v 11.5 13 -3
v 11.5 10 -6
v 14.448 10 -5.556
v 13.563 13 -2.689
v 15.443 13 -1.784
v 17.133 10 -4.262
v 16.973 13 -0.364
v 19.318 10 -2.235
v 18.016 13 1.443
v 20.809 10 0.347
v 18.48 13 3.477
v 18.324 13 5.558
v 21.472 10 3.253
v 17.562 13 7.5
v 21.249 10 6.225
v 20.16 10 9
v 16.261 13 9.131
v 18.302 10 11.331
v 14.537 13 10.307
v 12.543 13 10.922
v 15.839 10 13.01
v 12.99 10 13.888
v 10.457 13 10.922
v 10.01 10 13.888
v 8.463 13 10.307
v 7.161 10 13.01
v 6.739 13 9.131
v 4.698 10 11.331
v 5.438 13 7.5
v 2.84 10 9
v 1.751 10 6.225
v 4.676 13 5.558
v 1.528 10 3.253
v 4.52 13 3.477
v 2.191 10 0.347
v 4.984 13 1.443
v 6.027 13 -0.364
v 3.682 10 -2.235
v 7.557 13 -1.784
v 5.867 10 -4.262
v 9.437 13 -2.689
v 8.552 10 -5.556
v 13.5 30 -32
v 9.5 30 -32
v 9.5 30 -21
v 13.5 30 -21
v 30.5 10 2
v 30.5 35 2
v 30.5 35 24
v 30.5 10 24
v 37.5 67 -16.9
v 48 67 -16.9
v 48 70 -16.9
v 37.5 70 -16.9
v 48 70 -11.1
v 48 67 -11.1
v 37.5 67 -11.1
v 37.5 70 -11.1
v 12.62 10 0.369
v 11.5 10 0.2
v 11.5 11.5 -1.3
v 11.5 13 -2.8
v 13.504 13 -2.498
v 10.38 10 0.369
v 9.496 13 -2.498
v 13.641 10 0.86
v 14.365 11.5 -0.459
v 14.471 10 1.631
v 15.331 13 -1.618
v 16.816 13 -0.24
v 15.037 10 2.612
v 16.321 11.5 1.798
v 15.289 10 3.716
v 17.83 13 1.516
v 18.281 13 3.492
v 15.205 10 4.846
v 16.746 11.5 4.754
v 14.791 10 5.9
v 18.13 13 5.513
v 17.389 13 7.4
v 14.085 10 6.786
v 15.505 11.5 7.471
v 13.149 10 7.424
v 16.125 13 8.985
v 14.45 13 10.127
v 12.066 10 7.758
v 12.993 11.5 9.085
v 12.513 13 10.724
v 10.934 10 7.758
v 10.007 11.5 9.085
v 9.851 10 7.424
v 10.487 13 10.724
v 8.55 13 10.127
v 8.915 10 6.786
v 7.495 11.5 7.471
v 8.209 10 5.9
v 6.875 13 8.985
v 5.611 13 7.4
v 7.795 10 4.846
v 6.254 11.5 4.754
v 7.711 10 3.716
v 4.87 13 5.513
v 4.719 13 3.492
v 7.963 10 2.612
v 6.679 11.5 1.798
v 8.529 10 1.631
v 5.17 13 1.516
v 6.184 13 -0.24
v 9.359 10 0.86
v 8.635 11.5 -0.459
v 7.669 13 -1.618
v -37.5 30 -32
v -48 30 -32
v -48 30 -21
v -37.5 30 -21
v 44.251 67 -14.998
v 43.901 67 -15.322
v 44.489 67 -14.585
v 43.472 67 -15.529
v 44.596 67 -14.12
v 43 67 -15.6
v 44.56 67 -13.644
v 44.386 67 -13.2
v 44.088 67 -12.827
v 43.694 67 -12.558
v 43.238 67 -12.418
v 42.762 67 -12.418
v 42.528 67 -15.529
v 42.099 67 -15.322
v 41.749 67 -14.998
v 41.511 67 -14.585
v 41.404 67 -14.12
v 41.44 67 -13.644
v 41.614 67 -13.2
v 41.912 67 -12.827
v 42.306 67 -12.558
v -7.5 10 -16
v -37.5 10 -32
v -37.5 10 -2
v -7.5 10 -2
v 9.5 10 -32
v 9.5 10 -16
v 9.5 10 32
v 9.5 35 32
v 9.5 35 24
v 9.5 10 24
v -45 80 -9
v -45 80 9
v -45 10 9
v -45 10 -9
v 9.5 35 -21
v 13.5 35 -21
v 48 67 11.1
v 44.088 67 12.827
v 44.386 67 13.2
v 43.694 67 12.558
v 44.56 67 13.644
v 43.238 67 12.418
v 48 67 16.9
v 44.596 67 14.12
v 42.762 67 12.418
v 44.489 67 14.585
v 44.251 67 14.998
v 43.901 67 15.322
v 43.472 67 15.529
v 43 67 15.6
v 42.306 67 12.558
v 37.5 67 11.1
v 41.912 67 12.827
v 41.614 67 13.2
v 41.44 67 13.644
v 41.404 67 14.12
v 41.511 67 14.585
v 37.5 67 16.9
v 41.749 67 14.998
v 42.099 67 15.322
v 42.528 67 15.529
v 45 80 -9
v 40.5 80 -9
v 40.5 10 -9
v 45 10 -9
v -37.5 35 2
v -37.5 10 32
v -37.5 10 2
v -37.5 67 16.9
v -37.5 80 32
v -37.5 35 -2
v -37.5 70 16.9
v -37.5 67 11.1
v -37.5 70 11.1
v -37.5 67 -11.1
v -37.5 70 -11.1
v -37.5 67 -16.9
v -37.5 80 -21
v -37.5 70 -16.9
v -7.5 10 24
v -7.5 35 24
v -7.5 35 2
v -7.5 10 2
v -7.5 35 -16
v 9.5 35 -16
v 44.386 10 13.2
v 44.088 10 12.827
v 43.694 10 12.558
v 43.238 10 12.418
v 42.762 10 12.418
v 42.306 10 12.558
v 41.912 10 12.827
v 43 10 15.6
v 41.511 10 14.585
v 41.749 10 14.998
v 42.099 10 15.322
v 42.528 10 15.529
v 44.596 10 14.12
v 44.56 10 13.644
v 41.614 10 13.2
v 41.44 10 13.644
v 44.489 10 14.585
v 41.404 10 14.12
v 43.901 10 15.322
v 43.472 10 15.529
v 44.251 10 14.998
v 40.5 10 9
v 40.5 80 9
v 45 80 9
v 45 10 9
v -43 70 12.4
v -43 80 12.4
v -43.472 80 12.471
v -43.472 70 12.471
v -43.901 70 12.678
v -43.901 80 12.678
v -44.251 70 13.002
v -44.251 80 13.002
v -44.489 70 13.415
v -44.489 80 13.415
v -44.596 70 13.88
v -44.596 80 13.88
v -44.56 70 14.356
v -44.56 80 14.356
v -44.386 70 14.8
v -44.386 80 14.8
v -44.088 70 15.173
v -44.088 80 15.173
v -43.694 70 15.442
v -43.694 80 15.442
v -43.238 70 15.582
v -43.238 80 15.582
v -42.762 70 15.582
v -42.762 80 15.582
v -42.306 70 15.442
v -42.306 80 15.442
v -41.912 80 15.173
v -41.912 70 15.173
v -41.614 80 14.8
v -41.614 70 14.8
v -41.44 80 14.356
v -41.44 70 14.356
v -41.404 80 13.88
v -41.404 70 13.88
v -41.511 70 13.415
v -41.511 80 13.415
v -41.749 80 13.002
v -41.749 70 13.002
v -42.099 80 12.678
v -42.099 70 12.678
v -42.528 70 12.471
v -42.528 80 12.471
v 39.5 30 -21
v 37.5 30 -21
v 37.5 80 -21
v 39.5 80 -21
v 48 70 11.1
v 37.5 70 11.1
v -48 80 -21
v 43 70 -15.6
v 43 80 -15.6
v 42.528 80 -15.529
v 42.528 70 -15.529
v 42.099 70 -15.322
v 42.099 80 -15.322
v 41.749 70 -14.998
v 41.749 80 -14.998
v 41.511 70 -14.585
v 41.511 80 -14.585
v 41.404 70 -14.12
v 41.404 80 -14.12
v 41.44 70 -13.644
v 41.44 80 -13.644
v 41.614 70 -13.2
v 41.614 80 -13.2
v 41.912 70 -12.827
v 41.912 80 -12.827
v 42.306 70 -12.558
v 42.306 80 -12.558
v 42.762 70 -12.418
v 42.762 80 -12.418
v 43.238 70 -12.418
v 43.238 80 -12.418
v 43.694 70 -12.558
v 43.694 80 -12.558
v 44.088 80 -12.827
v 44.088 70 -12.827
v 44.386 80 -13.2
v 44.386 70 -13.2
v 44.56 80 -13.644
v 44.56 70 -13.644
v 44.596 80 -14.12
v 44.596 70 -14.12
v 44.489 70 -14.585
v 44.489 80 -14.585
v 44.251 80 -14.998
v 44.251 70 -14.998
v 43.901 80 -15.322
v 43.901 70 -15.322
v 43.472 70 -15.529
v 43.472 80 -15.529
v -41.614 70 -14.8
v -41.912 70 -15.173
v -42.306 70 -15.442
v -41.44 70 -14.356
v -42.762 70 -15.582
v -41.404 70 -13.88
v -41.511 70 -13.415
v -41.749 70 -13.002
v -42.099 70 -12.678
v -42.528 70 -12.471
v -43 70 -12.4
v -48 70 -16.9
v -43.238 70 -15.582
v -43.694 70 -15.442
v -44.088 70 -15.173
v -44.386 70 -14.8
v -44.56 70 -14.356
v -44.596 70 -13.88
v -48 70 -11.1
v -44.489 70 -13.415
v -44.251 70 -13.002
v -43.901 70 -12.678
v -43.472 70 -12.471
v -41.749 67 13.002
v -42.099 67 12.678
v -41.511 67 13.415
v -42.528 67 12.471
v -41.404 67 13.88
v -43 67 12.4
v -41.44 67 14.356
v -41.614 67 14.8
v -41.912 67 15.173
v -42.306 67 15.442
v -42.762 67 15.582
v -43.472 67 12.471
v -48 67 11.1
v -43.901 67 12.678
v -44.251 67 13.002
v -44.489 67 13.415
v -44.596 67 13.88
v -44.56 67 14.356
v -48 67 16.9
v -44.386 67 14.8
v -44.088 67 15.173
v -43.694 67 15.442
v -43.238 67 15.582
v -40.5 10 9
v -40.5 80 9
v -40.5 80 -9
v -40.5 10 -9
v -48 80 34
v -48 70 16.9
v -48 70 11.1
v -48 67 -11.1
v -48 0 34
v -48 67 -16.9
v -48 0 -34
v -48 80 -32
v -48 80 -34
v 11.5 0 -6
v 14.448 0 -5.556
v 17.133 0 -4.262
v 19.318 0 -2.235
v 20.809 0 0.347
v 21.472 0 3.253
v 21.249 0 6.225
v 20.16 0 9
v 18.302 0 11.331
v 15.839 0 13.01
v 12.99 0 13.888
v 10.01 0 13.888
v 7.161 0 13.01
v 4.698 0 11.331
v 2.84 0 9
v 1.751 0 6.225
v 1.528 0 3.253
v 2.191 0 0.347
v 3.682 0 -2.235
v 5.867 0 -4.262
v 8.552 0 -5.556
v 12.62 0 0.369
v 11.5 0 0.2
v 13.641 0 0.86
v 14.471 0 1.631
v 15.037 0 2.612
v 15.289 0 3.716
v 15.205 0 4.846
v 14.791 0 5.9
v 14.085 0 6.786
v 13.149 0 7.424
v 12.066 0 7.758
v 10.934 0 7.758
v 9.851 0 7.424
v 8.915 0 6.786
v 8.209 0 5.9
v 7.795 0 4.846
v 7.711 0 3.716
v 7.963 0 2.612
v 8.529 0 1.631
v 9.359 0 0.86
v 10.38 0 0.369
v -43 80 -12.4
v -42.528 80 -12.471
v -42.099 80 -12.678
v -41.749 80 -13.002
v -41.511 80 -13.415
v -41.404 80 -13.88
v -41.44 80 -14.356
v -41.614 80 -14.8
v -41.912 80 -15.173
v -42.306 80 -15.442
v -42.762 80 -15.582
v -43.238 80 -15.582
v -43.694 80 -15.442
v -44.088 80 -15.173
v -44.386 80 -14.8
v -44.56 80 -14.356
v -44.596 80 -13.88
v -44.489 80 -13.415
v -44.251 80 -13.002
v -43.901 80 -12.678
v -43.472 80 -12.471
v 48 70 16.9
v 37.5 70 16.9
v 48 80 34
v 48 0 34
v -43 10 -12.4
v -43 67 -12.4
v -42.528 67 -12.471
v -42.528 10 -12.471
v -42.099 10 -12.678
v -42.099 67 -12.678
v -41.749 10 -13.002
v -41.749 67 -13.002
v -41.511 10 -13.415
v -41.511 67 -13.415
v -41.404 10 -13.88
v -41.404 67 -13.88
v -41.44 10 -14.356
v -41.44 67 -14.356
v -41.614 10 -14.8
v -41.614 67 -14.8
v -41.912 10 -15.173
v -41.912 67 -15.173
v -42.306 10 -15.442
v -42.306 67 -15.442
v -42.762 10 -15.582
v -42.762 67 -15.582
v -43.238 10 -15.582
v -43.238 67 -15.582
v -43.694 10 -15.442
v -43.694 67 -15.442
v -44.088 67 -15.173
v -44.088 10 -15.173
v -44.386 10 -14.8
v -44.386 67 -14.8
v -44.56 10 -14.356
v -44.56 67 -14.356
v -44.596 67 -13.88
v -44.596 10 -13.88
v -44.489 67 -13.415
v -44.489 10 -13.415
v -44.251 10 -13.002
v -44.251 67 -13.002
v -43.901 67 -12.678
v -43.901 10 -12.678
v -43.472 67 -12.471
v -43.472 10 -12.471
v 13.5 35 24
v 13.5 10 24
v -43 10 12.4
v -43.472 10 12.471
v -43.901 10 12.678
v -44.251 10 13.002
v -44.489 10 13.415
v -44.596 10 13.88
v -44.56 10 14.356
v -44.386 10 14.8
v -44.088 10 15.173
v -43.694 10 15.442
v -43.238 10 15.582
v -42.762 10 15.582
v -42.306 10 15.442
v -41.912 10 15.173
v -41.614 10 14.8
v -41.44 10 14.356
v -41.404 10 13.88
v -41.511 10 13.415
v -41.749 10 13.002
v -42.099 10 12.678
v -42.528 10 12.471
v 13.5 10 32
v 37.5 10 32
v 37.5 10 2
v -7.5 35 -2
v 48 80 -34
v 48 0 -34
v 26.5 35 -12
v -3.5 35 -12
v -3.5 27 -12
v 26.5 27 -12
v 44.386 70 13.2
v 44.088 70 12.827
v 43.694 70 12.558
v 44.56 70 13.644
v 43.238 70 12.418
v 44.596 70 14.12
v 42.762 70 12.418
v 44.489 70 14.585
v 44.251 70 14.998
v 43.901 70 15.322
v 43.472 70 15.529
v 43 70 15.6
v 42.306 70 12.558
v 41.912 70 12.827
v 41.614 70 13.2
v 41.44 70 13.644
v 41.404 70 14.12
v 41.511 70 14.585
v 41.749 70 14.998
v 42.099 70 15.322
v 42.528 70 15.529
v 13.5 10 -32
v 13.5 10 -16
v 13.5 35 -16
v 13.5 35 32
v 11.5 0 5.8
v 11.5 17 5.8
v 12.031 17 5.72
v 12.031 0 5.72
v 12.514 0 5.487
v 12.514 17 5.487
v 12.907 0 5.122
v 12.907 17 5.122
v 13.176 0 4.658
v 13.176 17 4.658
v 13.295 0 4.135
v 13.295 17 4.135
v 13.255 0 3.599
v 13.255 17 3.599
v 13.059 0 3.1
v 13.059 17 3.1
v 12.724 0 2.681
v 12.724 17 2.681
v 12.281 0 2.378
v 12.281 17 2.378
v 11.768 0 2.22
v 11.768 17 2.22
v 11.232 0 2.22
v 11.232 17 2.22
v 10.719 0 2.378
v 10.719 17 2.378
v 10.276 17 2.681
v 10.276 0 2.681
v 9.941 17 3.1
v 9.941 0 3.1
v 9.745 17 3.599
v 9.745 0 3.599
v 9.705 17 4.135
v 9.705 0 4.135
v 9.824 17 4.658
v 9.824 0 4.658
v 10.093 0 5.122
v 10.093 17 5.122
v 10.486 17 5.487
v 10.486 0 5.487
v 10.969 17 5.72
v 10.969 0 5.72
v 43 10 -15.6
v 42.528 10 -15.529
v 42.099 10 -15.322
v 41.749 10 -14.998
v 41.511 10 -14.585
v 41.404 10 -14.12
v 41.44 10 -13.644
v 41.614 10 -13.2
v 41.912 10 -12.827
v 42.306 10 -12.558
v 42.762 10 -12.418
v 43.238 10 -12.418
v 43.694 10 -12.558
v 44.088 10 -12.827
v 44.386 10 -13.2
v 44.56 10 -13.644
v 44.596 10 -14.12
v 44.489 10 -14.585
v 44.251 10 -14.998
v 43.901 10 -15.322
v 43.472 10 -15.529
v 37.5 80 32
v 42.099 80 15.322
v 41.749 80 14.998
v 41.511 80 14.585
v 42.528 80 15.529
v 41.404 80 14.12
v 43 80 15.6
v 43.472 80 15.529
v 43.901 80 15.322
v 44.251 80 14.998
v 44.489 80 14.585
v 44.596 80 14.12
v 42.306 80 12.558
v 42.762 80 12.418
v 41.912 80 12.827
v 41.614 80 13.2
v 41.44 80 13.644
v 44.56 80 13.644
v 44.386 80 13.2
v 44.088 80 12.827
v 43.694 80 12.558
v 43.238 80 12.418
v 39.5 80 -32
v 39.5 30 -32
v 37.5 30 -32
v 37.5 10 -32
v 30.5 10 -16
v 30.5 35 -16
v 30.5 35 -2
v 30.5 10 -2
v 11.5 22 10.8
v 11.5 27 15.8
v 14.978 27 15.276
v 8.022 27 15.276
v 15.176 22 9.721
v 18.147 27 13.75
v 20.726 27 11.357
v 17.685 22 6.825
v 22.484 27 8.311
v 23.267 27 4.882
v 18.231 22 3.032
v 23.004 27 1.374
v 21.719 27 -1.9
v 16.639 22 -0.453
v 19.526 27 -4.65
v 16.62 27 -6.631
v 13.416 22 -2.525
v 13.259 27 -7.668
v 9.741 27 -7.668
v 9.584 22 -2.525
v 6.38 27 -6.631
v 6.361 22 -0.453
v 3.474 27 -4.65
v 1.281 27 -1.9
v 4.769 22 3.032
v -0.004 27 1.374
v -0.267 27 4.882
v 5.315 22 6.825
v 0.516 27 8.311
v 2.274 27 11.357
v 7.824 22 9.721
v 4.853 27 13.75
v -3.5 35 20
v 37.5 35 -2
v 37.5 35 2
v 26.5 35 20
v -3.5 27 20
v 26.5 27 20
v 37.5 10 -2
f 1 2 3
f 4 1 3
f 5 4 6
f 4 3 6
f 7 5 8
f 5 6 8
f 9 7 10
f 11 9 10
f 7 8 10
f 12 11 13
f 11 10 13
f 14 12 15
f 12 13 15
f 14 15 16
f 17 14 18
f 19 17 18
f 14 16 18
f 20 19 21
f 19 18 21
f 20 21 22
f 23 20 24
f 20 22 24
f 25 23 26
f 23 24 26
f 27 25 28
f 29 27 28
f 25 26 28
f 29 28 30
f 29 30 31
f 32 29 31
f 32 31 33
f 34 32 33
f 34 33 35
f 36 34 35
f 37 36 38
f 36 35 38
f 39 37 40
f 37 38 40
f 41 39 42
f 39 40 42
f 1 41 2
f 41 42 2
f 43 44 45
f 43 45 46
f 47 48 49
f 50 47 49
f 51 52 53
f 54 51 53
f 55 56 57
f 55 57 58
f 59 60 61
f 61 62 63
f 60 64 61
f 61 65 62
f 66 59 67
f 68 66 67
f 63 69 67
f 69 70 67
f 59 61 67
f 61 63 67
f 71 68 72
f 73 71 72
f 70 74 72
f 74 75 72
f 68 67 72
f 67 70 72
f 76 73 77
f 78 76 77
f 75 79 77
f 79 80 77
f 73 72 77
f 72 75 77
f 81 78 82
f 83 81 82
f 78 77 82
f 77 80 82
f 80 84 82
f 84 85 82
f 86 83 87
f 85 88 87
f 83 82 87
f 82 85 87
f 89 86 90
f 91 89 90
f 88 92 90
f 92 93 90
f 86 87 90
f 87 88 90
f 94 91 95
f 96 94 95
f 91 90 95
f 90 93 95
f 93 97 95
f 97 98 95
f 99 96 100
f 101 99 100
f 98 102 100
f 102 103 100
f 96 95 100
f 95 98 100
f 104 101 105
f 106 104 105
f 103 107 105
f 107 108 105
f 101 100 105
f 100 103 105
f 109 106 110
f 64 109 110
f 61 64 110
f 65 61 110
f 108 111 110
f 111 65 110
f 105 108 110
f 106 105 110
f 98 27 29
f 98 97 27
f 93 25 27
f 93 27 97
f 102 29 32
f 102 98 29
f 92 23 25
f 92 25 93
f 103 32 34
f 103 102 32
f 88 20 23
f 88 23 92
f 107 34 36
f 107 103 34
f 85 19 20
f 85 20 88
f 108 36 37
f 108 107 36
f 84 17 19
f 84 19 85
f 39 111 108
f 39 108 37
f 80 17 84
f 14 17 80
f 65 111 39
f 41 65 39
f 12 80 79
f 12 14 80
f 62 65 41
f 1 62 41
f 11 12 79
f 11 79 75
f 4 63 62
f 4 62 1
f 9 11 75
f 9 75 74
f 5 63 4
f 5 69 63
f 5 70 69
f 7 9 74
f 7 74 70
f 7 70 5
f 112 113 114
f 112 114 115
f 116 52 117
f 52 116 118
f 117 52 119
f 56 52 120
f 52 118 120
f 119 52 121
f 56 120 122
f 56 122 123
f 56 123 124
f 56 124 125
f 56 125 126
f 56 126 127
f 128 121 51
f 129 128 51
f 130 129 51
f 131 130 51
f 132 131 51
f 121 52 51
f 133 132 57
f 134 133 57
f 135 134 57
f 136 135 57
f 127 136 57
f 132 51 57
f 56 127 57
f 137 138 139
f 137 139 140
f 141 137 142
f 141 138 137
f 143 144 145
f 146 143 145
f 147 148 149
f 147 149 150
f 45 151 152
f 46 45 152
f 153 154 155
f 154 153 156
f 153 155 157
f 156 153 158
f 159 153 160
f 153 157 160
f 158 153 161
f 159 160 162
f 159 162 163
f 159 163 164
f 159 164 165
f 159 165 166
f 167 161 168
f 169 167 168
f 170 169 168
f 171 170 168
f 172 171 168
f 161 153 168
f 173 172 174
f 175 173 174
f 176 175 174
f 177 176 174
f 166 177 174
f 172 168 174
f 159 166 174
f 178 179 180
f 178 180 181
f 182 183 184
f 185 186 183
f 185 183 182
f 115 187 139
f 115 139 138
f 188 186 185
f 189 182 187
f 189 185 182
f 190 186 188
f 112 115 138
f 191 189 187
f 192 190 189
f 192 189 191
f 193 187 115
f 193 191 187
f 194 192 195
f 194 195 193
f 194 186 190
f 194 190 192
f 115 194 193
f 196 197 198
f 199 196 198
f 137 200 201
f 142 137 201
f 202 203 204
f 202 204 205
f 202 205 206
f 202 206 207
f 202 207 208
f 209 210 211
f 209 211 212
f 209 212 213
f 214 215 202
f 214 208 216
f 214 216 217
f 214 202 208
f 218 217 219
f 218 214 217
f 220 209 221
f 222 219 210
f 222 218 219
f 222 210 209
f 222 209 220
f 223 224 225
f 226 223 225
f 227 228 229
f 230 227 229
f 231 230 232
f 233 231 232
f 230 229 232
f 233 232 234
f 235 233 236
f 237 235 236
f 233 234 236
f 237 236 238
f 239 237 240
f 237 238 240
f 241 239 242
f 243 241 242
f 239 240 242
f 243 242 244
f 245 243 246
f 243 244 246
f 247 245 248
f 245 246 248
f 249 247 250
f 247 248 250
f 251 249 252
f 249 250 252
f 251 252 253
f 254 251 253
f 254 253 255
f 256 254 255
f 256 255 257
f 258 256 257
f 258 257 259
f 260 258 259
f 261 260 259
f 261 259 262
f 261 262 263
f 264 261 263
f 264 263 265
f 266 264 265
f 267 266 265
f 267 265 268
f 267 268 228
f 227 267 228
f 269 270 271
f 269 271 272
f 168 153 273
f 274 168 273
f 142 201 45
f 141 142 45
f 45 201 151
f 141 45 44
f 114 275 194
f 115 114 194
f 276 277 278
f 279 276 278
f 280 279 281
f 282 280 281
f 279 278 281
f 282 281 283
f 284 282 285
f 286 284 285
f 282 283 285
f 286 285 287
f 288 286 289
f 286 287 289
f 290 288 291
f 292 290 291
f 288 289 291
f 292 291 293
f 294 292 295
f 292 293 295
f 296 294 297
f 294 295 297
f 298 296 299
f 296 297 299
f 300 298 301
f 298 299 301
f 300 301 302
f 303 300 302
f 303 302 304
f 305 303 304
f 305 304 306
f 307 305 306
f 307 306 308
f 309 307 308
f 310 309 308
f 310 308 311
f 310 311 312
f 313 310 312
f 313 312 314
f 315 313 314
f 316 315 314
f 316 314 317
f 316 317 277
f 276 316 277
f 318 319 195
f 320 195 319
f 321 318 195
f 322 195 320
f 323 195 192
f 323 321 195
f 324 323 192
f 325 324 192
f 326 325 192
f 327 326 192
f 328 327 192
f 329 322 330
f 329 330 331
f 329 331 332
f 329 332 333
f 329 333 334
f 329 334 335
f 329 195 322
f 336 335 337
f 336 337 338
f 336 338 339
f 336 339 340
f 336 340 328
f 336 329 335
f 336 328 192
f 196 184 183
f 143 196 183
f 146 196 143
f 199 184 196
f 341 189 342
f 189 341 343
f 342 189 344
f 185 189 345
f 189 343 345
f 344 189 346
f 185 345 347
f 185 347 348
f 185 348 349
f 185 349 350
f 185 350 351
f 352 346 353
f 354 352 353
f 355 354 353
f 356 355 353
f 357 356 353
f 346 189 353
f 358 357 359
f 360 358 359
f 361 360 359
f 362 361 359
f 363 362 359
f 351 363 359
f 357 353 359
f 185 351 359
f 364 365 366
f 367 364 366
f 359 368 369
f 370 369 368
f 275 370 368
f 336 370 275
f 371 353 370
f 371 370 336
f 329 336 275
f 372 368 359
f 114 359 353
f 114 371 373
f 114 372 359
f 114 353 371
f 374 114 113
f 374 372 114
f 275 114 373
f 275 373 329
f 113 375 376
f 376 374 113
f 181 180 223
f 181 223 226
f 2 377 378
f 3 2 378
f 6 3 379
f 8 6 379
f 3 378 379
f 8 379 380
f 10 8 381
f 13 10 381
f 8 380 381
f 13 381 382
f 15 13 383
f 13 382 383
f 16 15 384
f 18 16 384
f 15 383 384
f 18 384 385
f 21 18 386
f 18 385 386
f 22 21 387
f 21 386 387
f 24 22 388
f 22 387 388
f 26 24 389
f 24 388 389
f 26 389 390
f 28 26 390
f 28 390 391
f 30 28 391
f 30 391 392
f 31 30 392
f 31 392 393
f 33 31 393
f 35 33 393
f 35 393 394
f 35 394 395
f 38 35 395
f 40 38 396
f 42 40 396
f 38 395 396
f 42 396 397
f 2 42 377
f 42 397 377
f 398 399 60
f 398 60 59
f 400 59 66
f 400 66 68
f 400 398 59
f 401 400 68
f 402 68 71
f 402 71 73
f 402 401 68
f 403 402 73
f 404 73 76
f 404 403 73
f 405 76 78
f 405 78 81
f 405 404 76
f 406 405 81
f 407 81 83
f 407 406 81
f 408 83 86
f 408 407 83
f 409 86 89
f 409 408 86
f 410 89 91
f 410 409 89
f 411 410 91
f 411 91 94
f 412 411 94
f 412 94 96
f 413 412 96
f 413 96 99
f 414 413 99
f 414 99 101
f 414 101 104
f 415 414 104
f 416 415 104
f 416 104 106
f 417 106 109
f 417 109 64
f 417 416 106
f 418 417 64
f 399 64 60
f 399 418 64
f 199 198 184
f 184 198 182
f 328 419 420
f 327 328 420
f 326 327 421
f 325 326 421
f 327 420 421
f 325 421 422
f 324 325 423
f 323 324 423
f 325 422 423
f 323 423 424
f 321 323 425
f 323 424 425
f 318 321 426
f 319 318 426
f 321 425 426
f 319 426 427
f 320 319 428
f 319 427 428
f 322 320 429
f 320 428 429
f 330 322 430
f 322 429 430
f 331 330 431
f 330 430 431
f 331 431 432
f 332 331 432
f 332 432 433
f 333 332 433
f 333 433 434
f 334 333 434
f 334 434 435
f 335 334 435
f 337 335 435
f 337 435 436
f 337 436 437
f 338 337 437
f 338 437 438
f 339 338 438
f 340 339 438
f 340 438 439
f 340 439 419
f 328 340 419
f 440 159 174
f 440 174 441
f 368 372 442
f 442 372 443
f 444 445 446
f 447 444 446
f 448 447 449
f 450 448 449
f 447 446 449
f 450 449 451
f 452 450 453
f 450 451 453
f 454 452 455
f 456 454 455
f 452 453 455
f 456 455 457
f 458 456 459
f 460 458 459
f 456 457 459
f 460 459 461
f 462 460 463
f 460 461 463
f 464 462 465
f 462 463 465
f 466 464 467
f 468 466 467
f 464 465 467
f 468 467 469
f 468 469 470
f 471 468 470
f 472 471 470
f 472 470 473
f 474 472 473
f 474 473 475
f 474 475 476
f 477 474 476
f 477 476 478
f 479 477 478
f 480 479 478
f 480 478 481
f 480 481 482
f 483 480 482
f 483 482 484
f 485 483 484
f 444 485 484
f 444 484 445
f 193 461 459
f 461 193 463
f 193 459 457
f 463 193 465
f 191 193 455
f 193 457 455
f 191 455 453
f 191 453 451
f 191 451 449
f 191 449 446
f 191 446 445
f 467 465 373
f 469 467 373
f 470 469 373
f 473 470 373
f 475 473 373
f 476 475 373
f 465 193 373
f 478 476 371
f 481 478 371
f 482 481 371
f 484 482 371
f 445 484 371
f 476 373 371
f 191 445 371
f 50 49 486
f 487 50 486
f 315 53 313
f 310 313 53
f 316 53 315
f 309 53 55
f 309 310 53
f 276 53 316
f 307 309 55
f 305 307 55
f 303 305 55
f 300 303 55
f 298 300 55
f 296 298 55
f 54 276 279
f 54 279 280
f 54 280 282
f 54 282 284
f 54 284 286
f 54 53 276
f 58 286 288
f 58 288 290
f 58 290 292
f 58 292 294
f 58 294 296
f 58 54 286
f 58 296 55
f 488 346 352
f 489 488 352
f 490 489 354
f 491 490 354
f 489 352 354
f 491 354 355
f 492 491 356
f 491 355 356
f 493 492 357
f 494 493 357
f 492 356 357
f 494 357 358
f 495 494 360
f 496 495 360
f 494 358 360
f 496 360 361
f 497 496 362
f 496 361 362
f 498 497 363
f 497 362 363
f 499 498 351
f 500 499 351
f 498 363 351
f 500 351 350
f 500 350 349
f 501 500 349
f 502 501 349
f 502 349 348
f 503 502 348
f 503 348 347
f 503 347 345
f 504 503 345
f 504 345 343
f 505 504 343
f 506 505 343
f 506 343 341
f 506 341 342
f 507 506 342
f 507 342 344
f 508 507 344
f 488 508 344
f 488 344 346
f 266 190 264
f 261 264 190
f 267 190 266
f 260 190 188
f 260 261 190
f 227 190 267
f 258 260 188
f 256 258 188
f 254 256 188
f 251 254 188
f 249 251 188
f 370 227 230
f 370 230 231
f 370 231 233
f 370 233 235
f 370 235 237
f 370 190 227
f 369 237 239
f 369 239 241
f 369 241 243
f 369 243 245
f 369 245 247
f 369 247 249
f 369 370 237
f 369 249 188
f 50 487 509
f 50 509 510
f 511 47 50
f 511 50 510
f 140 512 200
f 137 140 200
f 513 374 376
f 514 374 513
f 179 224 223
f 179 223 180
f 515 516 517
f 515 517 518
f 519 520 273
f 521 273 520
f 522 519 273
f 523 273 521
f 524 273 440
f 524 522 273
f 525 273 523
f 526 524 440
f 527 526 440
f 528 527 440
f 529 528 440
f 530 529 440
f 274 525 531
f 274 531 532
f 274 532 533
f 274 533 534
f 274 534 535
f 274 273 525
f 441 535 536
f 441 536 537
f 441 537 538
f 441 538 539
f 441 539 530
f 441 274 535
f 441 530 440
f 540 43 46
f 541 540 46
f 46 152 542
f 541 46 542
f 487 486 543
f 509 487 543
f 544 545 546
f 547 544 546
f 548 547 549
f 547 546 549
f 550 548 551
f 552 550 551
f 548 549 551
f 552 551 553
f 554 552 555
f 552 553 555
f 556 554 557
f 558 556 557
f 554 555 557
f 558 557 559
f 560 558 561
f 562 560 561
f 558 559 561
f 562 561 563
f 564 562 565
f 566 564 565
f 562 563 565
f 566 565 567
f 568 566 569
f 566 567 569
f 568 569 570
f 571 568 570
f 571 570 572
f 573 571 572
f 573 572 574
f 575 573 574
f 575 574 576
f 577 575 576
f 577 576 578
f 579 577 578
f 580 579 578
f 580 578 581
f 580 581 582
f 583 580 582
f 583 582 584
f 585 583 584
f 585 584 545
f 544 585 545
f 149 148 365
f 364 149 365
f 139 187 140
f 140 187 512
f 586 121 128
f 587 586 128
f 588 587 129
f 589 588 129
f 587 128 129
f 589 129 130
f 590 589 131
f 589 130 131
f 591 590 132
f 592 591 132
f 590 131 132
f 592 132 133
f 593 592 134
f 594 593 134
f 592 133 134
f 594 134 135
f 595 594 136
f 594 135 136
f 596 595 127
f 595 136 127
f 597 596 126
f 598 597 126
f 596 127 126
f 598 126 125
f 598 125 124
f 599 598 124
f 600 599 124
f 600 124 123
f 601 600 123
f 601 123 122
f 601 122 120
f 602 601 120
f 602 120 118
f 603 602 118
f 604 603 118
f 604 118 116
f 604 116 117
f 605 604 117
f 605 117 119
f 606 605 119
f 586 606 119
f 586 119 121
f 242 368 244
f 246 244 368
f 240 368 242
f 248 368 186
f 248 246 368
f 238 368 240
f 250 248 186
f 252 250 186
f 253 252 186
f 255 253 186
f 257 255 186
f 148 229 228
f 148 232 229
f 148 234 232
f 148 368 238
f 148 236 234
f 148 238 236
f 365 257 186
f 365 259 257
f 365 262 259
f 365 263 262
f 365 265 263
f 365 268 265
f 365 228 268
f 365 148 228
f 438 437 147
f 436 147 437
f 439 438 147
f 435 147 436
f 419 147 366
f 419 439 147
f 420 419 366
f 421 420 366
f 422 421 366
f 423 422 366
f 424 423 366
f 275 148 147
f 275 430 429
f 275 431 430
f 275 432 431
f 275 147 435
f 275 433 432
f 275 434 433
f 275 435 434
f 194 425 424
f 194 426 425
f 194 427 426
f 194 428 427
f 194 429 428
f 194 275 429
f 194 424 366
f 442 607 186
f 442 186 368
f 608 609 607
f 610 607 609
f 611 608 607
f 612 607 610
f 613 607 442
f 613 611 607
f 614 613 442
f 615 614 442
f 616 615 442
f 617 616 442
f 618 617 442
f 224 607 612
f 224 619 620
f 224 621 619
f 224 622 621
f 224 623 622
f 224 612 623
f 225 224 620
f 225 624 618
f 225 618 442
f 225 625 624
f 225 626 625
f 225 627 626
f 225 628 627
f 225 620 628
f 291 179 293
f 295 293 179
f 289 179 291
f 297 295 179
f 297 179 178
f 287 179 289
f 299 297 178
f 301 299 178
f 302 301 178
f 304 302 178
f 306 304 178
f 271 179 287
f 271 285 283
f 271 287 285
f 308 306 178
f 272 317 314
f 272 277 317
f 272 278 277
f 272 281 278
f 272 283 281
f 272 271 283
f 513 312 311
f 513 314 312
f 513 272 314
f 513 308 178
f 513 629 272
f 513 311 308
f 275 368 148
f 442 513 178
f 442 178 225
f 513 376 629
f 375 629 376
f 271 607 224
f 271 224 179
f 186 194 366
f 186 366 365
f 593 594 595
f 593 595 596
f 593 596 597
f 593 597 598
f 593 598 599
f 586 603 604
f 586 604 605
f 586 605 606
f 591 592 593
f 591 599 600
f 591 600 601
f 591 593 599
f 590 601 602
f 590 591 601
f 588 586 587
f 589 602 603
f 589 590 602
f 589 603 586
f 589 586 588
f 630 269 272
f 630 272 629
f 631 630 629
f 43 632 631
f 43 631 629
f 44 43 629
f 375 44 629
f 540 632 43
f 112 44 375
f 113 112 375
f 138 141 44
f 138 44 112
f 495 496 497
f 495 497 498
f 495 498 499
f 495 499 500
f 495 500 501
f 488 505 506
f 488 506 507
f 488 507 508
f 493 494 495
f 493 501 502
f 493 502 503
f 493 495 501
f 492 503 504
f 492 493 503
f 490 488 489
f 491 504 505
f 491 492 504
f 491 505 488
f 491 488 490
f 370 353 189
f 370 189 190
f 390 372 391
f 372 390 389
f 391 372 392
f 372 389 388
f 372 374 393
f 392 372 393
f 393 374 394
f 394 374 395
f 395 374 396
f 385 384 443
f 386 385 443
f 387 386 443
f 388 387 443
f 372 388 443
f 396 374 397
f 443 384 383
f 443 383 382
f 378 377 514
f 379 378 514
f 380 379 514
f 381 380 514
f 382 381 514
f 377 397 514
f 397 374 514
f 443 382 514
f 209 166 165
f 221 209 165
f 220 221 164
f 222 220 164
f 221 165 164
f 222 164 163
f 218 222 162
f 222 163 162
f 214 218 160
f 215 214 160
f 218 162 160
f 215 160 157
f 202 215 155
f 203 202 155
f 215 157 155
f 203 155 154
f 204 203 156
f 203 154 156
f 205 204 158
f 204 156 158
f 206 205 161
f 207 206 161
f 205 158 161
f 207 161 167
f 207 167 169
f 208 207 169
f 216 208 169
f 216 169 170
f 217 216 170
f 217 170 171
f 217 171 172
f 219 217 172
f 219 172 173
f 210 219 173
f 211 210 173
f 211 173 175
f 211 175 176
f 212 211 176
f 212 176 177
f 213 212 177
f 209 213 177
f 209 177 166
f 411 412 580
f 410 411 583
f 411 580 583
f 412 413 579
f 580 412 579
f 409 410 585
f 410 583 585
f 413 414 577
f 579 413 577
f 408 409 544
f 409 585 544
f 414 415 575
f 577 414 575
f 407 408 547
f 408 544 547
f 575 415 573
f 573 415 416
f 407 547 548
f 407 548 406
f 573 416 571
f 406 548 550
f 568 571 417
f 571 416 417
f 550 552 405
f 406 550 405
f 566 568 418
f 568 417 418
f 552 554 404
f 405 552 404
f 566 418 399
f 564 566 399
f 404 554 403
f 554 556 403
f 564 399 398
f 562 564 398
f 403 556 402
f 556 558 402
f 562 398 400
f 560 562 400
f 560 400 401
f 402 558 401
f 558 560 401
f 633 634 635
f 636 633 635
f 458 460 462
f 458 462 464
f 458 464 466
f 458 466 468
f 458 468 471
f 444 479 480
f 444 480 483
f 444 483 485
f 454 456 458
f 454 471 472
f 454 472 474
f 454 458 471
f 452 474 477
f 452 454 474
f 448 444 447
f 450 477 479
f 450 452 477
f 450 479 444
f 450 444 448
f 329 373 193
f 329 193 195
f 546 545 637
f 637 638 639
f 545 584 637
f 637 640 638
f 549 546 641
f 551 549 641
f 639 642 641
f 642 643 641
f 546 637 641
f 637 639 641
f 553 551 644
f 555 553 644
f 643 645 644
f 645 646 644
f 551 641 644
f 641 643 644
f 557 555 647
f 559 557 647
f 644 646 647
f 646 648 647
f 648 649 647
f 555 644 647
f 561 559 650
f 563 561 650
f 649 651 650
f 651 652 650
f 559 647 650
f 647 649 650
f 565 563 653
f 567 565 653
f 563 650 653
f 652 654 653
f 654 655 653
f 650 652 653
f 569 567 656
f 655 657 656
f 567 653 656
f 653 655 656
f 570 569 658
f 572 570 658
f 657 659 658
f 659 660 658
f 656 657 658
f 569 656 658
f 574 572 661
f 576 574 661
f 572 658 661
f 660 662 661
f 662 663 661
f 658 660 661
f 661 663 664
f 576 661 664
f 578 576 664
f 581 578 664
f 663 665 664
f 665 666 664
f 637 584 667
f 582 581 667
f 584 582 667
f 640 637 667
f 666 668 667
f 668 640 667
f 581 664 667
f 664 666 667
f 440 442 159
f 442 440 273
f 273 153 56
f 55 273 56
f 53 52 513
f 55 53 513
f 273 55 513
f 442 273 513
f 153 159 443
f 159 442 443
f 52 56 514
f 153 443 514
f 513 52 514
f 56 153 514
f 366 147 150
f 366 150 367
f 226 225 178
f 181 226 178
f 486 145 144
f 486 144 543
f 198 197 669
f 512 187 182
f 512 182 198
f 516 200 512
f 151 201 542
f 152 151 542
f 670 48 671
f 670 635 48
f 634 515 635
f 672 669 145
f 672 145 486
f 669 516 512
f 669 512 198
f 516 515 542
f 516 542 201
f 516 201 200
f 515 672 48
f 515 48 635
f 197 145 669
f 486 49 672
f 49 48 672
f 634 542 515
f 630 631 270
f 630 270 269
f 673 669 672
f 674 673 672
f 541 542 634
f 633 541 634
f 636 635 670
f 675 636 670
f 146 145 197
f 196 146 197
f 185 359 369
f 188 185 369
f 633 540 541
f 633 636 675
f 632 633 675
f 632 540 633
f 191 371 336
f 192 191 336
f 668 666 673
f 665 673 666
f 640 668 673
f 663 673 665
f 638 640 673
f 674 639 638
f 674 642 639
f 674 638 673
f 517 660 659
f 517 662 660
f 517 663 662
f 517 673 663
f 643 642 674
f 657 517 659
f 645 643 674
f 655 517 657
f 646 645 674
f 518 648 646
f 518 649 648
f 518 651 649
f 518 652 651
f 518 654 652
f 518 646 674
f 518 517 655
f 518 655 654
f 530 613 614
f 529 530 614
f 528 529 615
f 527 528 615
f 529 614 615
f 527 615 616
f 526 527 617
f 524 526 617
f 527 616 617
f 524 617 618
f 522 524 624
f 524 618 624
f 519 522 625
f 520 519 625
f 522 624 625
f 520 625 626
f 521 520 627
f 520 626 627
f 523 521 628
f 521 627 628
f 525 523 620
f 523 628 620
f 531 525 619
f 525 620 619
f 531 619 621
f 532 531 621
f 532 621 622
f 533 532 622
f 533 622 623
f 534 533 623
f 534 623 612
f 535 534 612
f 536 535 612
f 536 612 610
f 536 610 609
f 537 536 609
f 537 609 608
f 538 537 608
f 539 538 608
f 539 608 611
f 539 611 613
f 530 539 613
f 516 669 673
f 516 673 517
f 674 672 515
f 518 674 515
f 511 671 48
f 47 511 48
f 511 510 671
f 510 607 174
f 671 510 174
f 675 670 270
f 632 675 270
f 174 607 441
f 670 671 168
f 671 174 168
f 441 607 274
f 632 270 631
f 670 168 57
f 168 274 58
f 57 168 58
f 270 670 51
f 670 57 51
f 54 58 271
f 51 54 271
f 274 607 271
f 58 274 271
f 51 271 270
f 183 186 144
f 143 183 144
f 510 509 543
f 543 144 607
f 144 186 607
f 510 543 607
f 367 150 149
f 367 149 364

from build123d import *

# Parameters (mm, degrees)
SKETCH1_W                       = 96
SKETCH1_H                       = 68
BOSS_EXTRUDE1_DEPTH             = 80
SKETCH2_W                       = 75
SKETCH2_H                       = 64
CUT_EXTRUDE1_DEPTH              = 45
SKETCH3_W                       = 30
SKETCH3_H                       = 32
CUT_EXTRUDE2_DEPTH              = 8
SKETCH9_R                       = 1.8
CUT_EXTRUDE5_DEPTH              = 80.177016867
CHAMFER1_SIZE                   = 10
SKETCH10_R                      = 10
SKETCH10_R_2                    = 3.8
CUT_EXTRUDE7_DEPTH              = 13
CHAMFER2_SIZE                   = 3
CUT_EXTRUDE8_DEPTH              = 25
SKETCH12_R                      = 1.6
SKETCH12_W                      = 4.5
SKETCH12_H                      = 18
CUT_EXTRUDE9_DEPTH              = 70
SKETCH13_W                      = 5.8
SKETCH13_H                      = 3
CUT_EXTRUDE10_DEPTH             = 130.50675658
CUT_EXTRUDE11_DEPTH             = 5
CUT_EXTRUDE11_DIRECTION_2_REACH = 76.061


with BuildPart() as part:
    # Sketch1 → Boss-Extrude1 (new body)
    with BuildSketch(Plane(origin=(0, 0, 0), x_dir=(1, 0, 0), z_dir=(0, 1, 0))):
        Rectangle(SKETCH1_W, SKETCH1_H)
    extrude(amount=BOSS_EXTRUDE1_DEPTH)

    # Sketch2 → Cut-Extrude1 (cut)
    with BuildSketch(Plane(origin=(0, 80, 0), x_dir=(1, 0, 0), z_dir=(0, 1, 0))):
        Rectangle(SKETCH2_W, SKETCH2_H)
    extrude(amount=-CUT_EXTRUDE1_DEPTH, mode=Mode.SUBTRACT)

    # Sketch3 → Cut-Extrude2 (cut)
    with BuildSketch(Plane(origin=(0, 35, 0), x_dir=(1, 0, 0), z_dir=(0, 1, 0))):
        with Locations((11.5, -4)):
            Rectangle(SKETCH3_W, SKETCH3_H)
    extrude(amount=-CUT_EXTRUDE2_DEPTH, mode=Mode.SUBTRACT)

    # Sketch9 → Cut-Extrude5 (cut, through all)
    with BuildSketch(Plane(origin=(0, 27, 0), x_dir=(1, 0, 0), z_dir=(0, 1, 0))):
        with Locations(Location((11.5, -4, 0), (0, 0, 270))):
            Circle(SKETCH9_R)
    extrude(amount=-CUT_EXTRUDE5_DEPTH, mode=Mode.SUBTRACT)

    # Chamfer1
    chamfer1_edges = [part.edges().sort_by_distance(p)[0] for p in [
        (11.5, 27, 2.2),
    ]]
    chamfer(chamfer1_edges, length=CHAMFER1_SIZE)

    # Sketch10 → Cut-Extrude7 (cut)
    with BuildSketch(Plane.XZ):
        with Locations(Location((11.5, 4, 0), (0, 0, 270))):
            Circle(SKETCH10_R)
        with Locations(Location((11.5, 4, 0), (0, 0, 270))):
            Circle(SKETCH10_R_2, mode=Mode.SUBTRACT)
    extrude(amount=-CUT_EXTRUDE7_DEPTH, mode=Mode.SUBTRACT)

    # Chamfer2
    chamfer2_edges = [part.edges().sort_by_distance(p)[0] for p in [
        (11.5, 13, 14),
        (11.5, 13, 7.8),
    ]]
    chamfer(chamfer2_edges, length=CHAMFER2_SIZE)

    # Sketch11 → Cut-Extrude8 (cut)
    with BuildSketch(Plane(origin=(0, 35, 0), x_dir=(1, 0, 0), z_dir=(0, 1, 0))):
        Polygon((9.5, 32), (-37.5, 32), (-37.5, 2), (-7.5, 2), (-7.5, 16), (9.5, 16), align=None)
        Polygon((-7.5, -2), (-37.5, -2), (-37.5, -32), (9.5, -32), (9.5, -24), (-7.5, -24), align=None)
        Polygon((37.5, -32), (37.5, -2), (30.5, -2), (30.5, -24), (13.5, -24), (13.5, -32), align=None)
        Polygon((37.5, 32), (13.5, 32), (13.5, 16), (30.5, 16), (30.5, 2), (37.5, 2), align=None)
    extrude(amount=-CUT_EXTRUDE8_DEPTH, mode=Mode.SUBTRACT)

    # Sketch12 → Cut-Extrude9 (cut)
    with BuildSketch(Plane(origin=(0, 80, 0), x_dir=(1, 0, 0), z_dir=(0, 1, 0))):
        with Locations(Location((-43, 14, 0), (0, 0, 270))):
            Circle(SKETCH12_R)
        with Locations(Location((-43, -14, 0), (0, 0, 90))):
            Circle(SKETCH12_R)
        with Locations(Location((43, -14, 0), (0, 0, 270))):
            Circle(SKETCH12_R)
        with Locations(Location((43, 14, 0), (0, 0, 90))):
            Circle(SKETCH12_R)
        with Locations((-42.75, 0)):
            Rectangle(SKETCH12_W, SKETCH12_H)
        with Locations((42.75, 0)):
            Rectangle(SKETCH12_W, SKETCH12_H)
    extrude(amount=-CUT_EXTRUDE9_DEPTH, mode=Mode.SUBTRACT)

    # Sketch13 → Cut-Extrude10 (cut, through all)
    with BuildSketch(Plane.ZY.offset(48)):
        with Locations((-14, 68.5)):
            Rectangle(SKETCH13_W, SKETCH13_H)
        with Locations((14, 68.5)):
            Rectangle(SKETCH13_W, SKETCH13_H)
    extrude(amount=-CUT_EXTRUDE10_DEPTH, mode=Mode.SUBTRACT)

    # Sketch15 → Cut-Extrude11 (cut)
    with BuildSketch(Plane(origin=(0, 35, 0), x_dir=(1, 0, 0), z_dir=(0, 1, 0))):
        Polygon((-57.5, 28), (-57.5, 21), (39.5, 21), (39.5, 28), (39.5, 32), (-57.5, 32), align=None)
    extrude(amount=-CUT_EXTRUDE11_DEPTH, mode=Mode.SUBTRACT)

    # Cut-Extrude11 direction 2: up to this face of the body (flat: up to its plane)
    cut_extrude11_direction_2_end = Plane(part.part.faces().sort_by_distance((0, 80, -32.823564706))[0])
    # Sketch15 → Cut-Extrude11 direction 2 (cut, up to the picked face)
    with BuildSketch(Plane(origin=(0, 35, 0), x_dir=(1, 0, 0), z_dir=(0, 1, 0)), mode=Mode.PRIVATE) as cut_extrude11_direction_2_sk1:
        Polygon((-57.5, 28), (-57.5, 21), (39.5, 21), (39.5, 28), (39.5, 32), (-57.5, 32), align=None)
    cut_extrude11_direction_2_tool1 = split(extrude(cut_extrude11_direction_2_sk1.sketch, amount=CUT_EXTRUDE11_DIRECTION_2_REACH, mode=Mode.PRIVATE), bisect_by=cut_extrude11_direction_2_end, keep=Keep.BOTH, mode=Mode.PRIVATE)
    add(cut_extrude11_direction_2_tool1.solids().sort_by(Axis((-9, 35, -26.5), (0, 1, 0)))[0], mode=Mode.SUBTRACT)


solid = part.part
